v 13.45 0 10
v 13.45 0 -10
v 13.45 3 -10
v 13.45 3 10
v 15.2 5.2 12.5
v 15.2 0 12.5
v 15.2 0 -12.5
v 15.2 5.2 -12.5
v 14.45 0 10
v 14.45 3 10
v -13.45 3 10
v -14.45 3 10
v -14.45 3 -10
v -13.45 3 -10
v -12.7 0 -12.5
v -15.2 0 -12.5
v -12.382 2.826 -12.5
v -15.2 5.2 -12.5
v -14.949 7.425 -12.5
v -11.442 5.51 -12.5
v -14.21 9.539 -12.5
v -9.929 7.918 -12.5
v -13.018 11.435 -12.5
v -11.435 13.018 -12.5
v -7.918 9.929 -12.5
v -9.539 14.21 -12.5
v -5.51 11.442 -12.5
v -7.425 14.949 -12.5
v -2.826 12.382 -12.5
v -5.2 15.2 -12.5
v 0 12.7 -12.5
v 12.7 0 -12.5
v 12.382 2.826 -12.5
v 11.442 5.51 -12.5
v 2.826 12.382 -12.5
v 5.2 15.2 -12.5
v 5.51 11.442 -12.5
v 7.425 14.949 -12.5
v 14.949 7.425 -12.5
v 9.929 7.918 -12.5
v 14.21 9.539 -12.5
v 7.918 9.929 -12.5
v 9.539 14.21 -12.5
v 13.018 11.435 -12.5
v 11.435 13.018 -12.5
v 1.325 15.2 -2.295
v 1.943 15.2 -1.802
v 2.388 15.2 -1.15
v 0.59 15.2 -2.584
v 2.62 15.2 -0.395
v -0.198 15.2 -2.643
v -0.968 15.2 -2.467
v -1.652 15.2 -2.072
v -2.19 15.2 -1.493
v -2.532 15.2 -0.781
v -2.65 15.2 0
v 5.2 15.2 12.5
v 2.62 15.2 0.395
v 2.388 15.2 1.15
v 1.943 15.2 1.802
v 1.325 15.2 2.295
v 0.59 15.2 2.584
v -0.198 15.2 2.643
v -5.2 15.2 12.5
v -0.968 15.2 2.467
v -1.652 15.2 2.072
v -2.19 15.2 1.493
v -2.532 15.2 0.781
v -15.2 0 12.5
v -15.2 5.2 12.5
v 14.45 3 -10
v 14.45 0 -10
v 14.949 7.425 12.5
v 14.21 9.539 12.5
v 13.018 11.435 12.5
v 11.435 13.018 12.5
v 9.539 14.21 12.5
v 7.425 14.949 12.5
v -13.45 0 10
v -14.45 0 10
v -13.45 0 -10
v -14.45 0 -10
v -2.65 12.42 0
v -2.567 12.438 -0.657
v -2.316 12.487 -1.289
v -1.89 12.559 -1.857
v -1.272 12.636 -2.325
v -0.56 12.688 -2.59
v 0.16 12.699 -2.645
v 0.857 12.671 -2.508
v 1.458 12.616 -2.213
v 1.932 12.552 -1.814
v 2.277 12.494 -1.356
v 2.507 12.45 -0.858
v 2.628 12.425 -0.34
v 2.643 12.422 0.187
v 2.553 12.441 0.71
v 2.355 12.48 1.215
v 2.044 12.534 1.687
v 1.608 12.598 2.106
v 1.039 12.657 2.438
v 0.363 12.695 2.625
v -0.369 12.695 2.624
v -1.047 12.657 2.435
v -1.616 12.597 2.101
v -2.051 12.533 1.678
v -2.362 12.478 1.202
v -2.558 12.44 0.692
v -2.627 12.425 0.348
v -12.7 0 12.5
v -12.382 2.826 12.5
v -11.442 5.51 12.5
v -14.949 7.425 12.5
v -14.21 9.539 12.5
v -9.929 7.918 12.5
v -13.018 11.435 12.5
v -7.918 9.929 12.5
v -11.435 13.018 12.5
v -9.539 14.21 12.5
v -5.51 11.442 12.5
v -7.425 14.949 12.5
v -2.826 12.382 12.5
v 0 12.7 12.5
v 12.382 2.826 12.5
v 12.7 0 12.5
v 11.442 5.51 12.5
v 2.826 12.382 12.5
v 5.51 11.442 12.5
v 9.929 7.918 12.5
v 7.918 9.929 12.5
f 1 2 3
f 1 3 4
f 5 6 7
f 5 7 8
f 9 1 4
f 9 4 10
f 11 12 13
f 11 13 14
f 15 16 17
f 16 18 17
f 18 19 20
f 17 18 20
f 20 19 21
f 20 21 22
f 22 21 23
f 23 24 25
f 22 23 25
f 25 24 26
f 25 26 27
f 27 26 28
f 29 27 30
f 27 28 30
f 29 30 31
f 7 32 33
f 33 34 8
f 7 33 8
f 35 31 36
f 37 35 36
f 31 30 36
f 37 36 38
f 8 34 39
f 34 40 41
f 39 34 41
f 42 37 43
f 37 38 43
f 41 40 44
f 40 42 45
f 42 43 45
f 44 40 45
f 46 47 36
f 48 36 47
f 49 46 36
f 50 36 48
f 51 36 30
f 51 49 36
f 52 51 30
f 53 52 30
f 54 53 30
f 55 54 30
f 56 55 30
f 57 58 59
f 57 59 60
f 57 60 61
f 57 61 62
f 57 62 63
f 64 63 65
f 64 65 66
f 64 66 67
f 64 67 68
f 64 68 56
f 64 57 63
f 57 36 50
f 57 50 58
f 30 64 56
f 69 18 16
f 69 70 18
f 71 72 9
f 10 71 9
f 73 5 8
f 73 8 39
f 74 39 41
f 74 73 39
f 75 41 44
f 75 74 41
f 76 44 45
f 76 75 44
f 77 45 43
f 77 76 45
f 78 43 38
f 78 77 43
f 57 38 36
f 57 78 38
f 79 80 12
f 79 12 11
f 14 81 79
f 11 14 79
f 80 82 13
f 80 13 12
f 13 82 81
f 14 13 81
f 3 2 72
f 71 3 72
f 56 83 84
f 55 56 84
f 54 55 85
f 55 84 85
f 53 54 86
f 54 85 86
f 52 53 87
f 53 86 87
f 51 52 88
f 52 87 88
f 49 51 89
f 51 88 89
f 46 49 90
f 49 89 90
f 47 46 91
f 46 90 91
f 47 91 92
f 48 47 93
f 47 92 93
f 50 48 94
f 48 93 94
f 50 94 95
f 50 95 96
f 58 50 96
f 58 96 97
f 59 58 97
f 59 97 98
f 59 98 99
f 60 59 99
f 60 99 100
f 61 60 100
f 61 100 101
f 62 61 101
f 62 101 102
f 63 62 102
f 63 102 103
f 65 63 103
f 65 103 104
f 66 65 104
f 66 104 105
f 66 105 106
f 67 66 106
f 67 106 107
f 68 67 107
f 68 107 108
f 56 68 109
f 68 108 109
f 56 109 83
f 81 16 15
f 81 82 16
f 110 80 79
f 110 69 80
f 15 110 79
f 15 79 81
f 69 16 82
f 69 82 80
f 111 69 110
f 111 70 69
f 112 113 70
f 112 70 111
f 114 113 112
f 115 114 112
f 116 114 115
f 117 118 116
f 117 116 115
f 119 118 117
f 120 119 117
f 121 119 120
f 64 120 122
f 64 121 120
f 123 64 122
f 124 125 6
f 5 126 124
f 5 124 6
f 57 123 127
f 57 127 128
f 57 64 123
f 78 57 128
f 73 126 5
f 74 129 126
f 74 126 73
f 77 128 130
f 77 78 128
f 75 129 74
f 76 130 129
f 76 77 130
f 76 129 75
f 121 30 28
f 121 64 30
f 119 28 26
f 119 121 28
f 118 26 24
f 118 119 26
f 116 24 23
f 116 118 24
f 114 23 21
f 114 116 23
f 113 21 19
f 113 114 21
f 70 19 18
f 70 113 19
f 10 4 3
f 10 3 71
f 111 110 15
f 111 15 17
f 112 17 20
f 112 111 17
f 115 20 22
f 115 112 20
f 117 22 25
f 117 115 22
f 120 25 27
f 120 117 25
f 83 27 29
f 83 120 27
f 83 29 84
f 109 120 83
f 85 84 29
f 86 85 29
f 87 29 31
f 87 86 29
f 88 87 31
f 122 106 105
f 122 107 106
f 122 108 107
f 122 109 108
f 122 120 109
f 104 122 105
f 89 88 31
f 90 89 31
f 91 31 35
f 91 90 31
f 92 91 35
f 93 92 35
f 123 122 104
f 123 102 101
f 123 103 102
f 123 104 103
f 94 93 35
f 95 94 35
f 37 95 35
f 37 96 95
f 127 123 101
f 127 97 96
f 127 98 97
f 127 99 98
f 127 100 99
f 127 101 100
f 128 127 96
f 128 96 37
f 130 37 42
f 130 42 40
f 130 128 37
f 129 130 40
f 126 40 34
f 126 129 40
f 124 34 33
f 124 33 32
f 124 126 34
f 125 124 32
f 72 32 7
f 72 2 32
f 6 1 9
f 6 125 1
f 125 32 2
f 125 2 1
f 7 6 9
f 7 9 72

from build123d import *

# Parameters (mm, degrees)
BOSS_EXTRUDE1_DEPTH  = 12.5
M5_CLEARANCE_HOLE1_D = 5.3
SKETCH4_W            = 1
SKETCH4_H            = 20
CUT_EXTRUDE1_DEPTH   = 3


with BuildPart() as part:
    # Sketch1 → Boss-Extrude1 (new body, symmetric)
    with BuildSketch(Plane.XY):
        with BuildLine():
            Line((-15.2, 0), (-12.7, 0))
            ThreePointArc((-12.7, 0), (0, 12.7), (12.7, 0))
            Line((12.7, 0), (15.2, 0))
            Line((15.2, 0), (15.2, 5.2))
            ThreePointArc((15.2, 5.2), (12.271067812, 12.271067812), (5.2, 15.2))
            Line((5.2, 15.2), (-5.2, 15.2))
            ThreePointArc((-5.2, 15.2), (-12.271067812, 12.271067812), (-15.2, 5.2))
            Line((-15.2, 5.2), (-15.2, 0))
        make_face()
    extrude(amount=BOSS_EXTRUDE1_DEPTH, both=True)

    # M5 Clearance Hole1 (through all)
    with Locations(Plane(origin=(0, 15.2, 0), x_dir=(1, 0, 0), z_dir=(0, 1, 0))):
        with Locations((0, 0)):
            Hole(M5_CLEARANCE_HOLE1_D / 2)

    # Sketch4 → Cut-Extrude1 (cut)
    with BuildSketch(Plane.XZ):
        with Locations((-13.95, 0)):
            Rectangle(SKETCH4_W, SKETCH4_H)
        with Locations((13.95, 0)):
            Rectangle(SKETCH4_W, SKETCH4_H)
    extrude(amount=-CUT_EXTRUDE1_DEPTH, mode=Mode.SUBTRACT)


solid = part.part
